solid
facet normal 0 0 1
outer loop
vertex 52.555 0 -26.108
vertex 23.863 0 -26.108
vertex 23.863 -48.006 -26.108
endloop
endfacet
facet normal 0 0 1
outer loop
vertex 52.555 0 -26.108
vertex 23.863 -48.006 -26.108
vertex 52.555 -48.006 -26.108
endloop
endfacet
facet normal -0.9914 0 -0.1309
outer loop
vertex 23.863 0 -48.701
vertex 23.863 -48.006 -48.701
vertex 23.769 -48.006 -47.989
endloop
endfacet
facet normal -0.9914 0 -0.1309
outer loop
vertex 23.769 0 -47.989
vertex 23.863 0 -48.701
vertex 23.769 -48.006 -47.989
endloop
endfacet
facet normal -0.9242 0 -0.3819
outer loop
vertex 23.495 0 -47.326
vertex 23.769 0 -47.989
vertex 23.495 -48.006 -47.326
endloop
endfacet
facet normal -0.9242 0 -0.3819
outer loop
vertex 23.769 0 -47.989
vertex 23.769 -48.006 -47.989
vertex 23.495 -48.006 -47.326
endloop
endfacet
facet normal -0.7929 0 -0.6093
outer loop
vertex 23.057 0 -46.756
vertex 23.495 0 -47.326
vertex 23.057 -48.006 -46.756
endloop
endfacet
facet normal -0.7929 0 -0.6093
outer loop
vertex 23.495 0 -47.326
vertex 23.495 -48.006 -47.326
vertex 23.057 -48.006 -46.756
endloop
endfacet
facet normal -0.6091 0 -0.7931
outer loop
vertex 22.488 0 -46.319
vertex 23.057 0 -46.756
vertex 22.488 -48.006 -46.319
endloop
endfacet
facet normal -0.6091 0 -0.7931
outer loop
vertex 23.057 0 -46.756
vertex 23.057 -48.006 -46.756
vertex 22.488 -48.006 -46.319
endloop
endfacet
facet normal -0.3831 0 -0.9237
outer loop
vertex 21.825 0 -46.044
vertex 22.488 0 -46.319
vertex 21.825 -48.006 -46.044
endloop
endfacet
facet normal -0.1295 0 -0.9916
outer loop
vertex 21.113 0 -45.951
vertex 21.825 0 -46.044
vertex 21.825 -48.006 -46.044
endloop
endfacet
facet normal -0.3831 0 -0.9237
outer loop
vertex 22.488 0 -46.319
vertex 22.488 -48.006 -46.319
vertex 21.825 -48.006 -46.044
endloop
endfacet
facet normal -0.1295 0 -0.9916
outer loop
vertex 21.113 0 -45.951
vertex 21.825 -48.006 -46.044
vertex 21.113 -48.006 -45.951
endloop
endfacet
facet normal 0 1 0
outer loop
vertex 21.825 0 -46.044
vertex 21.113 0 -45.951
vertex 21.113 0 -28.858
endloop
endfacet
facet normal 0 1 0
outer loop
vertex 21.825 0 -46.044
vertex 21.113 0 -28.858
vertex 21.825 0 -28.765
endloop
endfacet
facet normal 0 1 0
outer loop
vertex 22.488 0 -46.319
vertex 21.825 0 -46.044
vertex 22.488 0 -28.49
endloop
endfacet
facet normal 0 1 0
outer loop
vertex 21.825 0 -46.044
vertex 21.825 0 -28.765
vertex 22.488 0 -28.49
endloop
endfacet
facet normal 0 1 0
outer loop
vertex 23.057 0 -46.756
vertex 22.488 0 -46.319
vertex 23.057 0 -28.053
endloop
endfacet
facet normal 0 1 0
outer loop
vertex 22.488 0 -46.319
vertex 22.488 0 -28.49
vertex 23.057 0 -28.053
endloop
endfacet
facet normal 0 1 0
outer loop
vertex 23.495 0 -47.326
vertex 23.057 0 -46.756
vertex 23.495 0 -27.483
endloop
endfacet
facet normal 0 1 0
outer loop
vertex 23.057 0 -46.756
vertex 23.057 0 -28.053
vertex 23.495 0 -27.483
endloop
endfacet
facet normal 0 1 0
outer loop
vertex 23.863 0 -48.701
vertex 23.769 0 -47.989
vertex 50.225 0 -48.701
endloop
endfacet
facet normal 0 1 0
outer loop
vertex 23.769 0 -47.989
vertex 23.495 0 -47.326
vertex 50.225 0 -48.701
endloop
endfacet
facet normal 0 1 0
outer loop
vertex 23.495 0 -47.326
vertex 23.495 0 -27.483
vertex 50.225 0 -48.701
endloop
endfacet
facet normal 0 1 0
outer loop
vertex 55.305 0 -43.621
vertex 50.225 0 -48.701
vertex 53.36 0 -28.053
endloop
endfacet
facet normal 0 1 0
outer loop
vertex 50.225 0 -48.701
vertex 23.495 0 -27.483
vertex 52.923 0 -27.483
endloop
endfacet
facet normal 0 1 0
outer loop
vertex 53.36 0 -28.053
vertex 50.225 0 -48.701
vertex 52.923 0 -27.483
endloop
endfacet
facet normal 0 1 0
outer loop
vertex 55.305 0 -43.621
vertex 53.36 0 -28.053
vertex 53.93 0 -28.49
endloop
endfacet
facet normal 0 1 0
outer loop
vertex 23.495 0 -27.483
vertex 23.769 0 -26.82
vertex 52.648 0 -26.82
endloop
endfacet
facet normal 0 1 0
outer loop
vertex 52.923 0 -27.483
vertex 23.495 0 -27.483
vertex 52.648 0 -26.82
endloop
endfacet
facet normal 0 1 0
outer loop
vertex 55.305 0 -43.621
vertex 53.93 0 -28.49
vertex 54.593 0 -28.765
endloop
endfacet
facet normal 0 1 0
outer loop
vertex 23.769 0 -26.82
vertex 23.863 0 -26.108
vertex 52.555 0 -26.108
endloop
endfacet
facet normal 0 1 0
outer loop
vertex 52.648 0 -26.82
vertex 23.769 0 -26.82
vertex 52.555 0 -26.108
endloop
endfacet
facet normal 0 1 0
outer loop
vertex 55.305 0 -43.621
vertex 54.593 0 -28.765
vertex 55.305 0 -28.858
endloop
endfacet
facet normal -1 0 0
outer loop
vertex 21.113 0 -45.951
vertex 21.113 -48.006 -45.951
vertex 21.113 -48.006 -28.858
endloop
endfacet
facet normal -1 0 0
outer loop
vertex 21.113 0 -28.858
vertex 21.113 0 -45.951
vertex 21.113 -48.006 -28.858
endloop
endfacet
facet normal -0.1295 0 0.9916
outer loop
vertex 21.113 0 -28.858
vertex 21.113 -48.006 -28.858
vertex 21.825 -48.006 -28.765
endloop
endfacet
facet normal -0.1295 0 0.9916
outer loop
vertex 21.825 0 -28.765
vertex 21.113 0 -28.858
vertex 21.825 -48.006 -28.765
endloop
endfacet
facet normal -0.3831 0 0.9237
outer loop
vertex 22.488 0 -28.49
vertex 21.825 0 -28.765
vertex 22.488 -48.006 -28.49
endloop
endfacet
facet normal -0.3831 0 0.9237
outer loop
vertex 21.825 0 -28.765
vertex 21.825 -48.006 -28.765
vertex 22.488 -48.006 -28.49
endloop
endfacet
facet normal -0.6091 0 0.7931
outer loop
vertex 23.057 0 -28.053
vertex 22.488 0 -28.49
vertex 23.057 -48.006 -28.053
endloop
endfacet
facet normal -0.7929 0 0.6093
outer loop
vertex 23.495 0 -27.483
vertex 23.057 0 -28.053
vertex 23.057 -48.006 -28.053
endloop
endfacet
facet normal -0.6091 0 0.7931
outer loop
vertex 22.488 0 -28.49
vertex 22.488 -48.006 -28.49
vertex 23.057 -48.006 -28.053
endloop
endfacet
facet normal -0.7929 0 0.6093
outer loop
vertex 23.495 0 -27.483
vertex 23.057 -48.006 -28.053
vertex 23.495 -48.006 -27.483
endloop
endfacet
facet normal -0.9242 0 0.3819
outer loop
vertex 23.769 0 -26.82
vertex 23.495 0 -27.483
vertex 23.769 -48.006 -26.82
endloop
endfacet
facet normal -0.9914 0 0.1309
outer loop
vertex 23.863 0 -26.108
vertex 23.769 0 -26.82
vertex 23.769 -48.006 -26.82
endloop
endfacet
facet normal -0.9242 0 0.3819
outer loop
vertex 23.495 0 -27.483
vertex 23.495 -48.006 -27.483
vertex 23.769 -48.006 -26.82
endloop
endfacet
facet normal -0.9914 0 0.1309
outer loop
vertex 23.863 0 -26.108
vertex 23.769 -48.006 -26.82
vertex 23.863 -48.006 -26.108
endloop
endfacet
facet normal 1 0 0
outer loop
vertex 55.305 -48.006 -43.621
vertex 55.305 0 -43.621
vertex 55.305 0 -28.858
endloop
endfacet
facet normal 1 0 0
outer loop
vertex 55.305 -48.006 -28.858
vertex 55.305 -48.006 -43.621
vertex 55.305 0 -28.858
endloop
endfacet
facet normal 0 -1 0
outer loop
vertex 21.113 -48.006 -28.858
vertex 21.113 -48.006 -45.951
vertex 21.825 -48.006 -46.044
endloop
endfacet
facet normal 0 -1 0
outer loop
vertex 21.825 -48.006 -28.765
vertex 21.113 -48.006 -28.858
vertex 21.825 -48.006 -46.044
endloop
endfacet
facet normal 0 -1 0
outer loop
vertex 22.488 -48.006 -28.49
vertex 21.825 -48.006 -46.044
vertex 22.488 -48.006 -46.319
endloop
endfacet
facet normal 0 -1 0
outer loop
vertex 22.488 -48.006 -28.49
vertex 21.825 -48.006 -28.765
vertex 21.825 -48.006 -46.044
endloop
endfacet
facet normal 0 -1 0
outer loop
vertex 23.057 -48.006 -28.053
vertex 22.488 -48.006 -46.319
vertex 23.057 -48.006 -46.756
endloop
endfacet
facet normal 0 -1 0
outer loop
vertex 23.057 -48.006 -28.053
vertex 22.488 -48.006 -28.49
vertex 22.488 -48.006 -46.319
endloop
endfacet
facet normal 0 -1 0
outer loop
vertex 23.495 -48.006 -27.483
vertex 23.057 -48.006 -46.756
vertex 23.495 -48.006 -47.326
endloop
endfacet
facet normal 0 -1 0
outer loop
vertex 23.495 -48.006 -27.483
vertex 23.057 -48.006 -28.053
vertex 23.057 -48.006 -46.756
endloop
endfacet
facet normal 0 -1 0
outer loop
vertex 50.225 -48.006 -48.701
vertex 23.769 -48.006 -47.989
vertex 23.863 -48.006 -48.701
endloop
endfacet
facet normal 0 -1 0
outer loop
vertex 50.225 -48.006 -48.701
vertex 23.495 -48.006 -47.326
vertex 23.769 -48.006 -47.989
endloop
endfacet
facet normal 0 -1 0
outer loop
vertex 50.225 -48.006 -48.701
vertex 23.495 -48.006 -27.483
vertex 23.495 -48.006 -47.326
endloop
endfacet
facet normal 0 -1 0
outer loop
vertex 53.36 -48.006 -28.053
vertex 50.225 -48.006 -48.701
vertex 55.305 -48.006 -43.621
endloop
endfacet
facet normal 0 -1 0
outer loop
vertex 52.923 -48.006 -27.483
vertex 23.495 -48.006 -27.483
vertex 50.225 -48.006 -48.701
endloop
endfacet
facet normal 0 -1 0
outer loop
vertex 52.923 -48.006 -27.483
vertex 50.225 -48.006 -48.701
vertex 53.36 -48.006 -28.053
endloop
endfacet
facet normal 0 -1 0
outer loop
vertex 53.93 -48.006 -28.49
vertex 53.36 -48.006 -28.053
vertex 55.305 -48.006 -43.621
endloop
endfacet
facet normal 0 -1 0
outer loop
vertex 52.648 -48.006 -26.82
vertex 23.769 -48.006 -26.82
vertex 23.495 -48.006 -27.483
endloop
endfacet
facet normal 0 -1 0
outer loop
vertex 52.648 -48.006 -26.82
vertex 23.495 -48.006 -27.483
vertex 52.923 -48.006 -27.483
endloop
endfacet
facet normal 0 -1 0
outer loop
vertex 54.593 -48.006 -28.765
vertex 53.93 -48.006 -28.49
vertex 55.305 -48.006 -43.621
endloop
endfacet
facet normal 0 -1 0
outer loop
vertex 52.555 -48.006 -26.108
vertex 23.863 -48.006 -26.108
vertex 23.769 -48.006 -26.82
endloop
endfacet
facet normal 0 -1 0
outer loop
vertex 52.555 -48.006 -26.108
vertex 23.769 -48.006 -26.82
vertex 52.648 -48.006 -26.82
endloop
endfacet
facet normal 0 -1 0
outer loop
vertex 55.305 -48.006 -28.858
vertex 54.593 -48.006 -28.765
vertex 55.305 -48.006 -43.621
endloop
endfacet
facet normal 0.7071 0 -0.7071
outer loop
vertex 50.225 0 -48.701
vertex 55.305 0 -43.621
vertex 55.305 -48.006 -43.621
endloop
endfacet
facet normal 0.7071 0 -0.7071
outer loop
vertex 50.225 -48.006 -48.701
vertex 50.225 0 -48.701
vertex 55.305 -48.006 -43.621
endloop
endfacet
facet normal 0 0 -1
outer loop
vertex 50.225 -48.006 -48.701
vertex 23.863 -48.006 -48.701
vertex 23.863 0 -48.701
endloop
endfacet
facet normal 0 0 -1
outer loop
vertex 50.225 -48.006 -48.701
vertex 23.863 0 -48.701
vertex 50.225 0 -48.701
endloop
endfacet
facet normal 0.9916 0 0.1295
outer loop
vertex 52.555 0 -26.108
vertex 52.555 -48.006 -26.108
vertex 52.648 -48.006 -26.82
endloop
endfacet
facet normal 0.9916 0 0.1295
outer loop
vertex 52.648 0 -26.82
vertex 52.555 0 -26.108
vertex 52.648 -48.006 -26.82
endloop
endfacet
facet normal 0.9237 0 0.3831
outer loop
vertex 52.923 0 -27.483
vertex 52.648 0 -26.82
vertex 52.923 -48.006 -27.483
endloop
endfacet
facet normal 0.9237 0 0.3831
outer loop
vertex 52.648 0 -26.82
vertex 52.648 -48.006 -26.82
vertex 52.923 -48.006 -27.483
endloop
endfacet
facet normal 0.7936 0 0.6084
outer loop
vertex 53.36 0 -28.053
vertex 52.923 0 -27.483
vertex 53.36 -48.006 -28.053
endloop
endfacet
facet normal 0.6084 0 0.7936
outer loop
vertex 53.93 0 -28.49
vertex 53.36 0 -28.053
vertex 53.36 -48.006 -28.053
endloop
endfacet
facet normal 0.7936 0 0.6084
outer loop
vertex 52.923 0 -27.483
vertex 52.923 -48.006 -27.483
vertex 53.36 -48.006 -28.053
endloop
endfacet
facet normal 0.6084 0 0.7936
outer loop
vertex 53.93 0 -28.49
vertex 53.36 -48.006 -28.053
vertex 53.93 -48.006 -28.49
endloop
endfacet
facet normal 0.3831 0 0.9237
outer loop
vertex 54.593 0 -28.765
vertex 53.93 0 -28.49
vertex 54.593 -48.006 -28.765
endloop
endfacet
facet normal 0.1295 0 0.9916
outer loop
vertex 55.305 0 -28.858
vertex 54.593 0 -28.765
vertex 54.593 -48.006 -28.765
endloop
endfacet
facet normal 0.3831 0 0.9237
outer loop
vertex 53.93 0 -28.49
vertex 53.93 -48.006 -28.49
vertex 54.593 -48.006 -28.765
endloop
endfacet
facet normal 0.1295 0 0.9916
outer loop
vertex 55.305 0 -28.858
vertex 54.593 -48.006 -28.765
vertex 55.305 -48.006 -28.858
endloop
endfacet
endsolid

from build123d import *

# Parameters (mm, degrees)
F0_W     = 34.1916419566
F0_H     = 22.5922781974
F1_DEPTH = 48.006
F2_SIZE  = 5.08
F3_D     = 5.5


with BuildPart() as f1:
    # F0 (on Front) → F1 (new body)
    with BuildSketch(Plane.XZ):
        with Locations((38.2087547332, -37.4044654891)):
            Rectangle(F0_W, F0_H)
    extrude(amount=F1_DEPTH)

    # F2
    f2_edges = [f1.edges().sort_by_distance(p)[0] for p in [
        (55.304576, -24.003, -48.700605),
    ]]
    chamfer(f2_edges, length=F2_SIZE)

    # F3 (through all)
    with Locations(Plane(origin=(0, 0, 0), x_dir=(1, 0, 0), z_dir=(0, 1, 0))):
        with Locations((55.3045757115, 48.7006045878), (55.3045757115, 26.1083263904), (21.1129337549, 48.7006045878), (21.1129337549, 26.1083263904)):
            Hole(F3_D / 2)


solid = f1.part
